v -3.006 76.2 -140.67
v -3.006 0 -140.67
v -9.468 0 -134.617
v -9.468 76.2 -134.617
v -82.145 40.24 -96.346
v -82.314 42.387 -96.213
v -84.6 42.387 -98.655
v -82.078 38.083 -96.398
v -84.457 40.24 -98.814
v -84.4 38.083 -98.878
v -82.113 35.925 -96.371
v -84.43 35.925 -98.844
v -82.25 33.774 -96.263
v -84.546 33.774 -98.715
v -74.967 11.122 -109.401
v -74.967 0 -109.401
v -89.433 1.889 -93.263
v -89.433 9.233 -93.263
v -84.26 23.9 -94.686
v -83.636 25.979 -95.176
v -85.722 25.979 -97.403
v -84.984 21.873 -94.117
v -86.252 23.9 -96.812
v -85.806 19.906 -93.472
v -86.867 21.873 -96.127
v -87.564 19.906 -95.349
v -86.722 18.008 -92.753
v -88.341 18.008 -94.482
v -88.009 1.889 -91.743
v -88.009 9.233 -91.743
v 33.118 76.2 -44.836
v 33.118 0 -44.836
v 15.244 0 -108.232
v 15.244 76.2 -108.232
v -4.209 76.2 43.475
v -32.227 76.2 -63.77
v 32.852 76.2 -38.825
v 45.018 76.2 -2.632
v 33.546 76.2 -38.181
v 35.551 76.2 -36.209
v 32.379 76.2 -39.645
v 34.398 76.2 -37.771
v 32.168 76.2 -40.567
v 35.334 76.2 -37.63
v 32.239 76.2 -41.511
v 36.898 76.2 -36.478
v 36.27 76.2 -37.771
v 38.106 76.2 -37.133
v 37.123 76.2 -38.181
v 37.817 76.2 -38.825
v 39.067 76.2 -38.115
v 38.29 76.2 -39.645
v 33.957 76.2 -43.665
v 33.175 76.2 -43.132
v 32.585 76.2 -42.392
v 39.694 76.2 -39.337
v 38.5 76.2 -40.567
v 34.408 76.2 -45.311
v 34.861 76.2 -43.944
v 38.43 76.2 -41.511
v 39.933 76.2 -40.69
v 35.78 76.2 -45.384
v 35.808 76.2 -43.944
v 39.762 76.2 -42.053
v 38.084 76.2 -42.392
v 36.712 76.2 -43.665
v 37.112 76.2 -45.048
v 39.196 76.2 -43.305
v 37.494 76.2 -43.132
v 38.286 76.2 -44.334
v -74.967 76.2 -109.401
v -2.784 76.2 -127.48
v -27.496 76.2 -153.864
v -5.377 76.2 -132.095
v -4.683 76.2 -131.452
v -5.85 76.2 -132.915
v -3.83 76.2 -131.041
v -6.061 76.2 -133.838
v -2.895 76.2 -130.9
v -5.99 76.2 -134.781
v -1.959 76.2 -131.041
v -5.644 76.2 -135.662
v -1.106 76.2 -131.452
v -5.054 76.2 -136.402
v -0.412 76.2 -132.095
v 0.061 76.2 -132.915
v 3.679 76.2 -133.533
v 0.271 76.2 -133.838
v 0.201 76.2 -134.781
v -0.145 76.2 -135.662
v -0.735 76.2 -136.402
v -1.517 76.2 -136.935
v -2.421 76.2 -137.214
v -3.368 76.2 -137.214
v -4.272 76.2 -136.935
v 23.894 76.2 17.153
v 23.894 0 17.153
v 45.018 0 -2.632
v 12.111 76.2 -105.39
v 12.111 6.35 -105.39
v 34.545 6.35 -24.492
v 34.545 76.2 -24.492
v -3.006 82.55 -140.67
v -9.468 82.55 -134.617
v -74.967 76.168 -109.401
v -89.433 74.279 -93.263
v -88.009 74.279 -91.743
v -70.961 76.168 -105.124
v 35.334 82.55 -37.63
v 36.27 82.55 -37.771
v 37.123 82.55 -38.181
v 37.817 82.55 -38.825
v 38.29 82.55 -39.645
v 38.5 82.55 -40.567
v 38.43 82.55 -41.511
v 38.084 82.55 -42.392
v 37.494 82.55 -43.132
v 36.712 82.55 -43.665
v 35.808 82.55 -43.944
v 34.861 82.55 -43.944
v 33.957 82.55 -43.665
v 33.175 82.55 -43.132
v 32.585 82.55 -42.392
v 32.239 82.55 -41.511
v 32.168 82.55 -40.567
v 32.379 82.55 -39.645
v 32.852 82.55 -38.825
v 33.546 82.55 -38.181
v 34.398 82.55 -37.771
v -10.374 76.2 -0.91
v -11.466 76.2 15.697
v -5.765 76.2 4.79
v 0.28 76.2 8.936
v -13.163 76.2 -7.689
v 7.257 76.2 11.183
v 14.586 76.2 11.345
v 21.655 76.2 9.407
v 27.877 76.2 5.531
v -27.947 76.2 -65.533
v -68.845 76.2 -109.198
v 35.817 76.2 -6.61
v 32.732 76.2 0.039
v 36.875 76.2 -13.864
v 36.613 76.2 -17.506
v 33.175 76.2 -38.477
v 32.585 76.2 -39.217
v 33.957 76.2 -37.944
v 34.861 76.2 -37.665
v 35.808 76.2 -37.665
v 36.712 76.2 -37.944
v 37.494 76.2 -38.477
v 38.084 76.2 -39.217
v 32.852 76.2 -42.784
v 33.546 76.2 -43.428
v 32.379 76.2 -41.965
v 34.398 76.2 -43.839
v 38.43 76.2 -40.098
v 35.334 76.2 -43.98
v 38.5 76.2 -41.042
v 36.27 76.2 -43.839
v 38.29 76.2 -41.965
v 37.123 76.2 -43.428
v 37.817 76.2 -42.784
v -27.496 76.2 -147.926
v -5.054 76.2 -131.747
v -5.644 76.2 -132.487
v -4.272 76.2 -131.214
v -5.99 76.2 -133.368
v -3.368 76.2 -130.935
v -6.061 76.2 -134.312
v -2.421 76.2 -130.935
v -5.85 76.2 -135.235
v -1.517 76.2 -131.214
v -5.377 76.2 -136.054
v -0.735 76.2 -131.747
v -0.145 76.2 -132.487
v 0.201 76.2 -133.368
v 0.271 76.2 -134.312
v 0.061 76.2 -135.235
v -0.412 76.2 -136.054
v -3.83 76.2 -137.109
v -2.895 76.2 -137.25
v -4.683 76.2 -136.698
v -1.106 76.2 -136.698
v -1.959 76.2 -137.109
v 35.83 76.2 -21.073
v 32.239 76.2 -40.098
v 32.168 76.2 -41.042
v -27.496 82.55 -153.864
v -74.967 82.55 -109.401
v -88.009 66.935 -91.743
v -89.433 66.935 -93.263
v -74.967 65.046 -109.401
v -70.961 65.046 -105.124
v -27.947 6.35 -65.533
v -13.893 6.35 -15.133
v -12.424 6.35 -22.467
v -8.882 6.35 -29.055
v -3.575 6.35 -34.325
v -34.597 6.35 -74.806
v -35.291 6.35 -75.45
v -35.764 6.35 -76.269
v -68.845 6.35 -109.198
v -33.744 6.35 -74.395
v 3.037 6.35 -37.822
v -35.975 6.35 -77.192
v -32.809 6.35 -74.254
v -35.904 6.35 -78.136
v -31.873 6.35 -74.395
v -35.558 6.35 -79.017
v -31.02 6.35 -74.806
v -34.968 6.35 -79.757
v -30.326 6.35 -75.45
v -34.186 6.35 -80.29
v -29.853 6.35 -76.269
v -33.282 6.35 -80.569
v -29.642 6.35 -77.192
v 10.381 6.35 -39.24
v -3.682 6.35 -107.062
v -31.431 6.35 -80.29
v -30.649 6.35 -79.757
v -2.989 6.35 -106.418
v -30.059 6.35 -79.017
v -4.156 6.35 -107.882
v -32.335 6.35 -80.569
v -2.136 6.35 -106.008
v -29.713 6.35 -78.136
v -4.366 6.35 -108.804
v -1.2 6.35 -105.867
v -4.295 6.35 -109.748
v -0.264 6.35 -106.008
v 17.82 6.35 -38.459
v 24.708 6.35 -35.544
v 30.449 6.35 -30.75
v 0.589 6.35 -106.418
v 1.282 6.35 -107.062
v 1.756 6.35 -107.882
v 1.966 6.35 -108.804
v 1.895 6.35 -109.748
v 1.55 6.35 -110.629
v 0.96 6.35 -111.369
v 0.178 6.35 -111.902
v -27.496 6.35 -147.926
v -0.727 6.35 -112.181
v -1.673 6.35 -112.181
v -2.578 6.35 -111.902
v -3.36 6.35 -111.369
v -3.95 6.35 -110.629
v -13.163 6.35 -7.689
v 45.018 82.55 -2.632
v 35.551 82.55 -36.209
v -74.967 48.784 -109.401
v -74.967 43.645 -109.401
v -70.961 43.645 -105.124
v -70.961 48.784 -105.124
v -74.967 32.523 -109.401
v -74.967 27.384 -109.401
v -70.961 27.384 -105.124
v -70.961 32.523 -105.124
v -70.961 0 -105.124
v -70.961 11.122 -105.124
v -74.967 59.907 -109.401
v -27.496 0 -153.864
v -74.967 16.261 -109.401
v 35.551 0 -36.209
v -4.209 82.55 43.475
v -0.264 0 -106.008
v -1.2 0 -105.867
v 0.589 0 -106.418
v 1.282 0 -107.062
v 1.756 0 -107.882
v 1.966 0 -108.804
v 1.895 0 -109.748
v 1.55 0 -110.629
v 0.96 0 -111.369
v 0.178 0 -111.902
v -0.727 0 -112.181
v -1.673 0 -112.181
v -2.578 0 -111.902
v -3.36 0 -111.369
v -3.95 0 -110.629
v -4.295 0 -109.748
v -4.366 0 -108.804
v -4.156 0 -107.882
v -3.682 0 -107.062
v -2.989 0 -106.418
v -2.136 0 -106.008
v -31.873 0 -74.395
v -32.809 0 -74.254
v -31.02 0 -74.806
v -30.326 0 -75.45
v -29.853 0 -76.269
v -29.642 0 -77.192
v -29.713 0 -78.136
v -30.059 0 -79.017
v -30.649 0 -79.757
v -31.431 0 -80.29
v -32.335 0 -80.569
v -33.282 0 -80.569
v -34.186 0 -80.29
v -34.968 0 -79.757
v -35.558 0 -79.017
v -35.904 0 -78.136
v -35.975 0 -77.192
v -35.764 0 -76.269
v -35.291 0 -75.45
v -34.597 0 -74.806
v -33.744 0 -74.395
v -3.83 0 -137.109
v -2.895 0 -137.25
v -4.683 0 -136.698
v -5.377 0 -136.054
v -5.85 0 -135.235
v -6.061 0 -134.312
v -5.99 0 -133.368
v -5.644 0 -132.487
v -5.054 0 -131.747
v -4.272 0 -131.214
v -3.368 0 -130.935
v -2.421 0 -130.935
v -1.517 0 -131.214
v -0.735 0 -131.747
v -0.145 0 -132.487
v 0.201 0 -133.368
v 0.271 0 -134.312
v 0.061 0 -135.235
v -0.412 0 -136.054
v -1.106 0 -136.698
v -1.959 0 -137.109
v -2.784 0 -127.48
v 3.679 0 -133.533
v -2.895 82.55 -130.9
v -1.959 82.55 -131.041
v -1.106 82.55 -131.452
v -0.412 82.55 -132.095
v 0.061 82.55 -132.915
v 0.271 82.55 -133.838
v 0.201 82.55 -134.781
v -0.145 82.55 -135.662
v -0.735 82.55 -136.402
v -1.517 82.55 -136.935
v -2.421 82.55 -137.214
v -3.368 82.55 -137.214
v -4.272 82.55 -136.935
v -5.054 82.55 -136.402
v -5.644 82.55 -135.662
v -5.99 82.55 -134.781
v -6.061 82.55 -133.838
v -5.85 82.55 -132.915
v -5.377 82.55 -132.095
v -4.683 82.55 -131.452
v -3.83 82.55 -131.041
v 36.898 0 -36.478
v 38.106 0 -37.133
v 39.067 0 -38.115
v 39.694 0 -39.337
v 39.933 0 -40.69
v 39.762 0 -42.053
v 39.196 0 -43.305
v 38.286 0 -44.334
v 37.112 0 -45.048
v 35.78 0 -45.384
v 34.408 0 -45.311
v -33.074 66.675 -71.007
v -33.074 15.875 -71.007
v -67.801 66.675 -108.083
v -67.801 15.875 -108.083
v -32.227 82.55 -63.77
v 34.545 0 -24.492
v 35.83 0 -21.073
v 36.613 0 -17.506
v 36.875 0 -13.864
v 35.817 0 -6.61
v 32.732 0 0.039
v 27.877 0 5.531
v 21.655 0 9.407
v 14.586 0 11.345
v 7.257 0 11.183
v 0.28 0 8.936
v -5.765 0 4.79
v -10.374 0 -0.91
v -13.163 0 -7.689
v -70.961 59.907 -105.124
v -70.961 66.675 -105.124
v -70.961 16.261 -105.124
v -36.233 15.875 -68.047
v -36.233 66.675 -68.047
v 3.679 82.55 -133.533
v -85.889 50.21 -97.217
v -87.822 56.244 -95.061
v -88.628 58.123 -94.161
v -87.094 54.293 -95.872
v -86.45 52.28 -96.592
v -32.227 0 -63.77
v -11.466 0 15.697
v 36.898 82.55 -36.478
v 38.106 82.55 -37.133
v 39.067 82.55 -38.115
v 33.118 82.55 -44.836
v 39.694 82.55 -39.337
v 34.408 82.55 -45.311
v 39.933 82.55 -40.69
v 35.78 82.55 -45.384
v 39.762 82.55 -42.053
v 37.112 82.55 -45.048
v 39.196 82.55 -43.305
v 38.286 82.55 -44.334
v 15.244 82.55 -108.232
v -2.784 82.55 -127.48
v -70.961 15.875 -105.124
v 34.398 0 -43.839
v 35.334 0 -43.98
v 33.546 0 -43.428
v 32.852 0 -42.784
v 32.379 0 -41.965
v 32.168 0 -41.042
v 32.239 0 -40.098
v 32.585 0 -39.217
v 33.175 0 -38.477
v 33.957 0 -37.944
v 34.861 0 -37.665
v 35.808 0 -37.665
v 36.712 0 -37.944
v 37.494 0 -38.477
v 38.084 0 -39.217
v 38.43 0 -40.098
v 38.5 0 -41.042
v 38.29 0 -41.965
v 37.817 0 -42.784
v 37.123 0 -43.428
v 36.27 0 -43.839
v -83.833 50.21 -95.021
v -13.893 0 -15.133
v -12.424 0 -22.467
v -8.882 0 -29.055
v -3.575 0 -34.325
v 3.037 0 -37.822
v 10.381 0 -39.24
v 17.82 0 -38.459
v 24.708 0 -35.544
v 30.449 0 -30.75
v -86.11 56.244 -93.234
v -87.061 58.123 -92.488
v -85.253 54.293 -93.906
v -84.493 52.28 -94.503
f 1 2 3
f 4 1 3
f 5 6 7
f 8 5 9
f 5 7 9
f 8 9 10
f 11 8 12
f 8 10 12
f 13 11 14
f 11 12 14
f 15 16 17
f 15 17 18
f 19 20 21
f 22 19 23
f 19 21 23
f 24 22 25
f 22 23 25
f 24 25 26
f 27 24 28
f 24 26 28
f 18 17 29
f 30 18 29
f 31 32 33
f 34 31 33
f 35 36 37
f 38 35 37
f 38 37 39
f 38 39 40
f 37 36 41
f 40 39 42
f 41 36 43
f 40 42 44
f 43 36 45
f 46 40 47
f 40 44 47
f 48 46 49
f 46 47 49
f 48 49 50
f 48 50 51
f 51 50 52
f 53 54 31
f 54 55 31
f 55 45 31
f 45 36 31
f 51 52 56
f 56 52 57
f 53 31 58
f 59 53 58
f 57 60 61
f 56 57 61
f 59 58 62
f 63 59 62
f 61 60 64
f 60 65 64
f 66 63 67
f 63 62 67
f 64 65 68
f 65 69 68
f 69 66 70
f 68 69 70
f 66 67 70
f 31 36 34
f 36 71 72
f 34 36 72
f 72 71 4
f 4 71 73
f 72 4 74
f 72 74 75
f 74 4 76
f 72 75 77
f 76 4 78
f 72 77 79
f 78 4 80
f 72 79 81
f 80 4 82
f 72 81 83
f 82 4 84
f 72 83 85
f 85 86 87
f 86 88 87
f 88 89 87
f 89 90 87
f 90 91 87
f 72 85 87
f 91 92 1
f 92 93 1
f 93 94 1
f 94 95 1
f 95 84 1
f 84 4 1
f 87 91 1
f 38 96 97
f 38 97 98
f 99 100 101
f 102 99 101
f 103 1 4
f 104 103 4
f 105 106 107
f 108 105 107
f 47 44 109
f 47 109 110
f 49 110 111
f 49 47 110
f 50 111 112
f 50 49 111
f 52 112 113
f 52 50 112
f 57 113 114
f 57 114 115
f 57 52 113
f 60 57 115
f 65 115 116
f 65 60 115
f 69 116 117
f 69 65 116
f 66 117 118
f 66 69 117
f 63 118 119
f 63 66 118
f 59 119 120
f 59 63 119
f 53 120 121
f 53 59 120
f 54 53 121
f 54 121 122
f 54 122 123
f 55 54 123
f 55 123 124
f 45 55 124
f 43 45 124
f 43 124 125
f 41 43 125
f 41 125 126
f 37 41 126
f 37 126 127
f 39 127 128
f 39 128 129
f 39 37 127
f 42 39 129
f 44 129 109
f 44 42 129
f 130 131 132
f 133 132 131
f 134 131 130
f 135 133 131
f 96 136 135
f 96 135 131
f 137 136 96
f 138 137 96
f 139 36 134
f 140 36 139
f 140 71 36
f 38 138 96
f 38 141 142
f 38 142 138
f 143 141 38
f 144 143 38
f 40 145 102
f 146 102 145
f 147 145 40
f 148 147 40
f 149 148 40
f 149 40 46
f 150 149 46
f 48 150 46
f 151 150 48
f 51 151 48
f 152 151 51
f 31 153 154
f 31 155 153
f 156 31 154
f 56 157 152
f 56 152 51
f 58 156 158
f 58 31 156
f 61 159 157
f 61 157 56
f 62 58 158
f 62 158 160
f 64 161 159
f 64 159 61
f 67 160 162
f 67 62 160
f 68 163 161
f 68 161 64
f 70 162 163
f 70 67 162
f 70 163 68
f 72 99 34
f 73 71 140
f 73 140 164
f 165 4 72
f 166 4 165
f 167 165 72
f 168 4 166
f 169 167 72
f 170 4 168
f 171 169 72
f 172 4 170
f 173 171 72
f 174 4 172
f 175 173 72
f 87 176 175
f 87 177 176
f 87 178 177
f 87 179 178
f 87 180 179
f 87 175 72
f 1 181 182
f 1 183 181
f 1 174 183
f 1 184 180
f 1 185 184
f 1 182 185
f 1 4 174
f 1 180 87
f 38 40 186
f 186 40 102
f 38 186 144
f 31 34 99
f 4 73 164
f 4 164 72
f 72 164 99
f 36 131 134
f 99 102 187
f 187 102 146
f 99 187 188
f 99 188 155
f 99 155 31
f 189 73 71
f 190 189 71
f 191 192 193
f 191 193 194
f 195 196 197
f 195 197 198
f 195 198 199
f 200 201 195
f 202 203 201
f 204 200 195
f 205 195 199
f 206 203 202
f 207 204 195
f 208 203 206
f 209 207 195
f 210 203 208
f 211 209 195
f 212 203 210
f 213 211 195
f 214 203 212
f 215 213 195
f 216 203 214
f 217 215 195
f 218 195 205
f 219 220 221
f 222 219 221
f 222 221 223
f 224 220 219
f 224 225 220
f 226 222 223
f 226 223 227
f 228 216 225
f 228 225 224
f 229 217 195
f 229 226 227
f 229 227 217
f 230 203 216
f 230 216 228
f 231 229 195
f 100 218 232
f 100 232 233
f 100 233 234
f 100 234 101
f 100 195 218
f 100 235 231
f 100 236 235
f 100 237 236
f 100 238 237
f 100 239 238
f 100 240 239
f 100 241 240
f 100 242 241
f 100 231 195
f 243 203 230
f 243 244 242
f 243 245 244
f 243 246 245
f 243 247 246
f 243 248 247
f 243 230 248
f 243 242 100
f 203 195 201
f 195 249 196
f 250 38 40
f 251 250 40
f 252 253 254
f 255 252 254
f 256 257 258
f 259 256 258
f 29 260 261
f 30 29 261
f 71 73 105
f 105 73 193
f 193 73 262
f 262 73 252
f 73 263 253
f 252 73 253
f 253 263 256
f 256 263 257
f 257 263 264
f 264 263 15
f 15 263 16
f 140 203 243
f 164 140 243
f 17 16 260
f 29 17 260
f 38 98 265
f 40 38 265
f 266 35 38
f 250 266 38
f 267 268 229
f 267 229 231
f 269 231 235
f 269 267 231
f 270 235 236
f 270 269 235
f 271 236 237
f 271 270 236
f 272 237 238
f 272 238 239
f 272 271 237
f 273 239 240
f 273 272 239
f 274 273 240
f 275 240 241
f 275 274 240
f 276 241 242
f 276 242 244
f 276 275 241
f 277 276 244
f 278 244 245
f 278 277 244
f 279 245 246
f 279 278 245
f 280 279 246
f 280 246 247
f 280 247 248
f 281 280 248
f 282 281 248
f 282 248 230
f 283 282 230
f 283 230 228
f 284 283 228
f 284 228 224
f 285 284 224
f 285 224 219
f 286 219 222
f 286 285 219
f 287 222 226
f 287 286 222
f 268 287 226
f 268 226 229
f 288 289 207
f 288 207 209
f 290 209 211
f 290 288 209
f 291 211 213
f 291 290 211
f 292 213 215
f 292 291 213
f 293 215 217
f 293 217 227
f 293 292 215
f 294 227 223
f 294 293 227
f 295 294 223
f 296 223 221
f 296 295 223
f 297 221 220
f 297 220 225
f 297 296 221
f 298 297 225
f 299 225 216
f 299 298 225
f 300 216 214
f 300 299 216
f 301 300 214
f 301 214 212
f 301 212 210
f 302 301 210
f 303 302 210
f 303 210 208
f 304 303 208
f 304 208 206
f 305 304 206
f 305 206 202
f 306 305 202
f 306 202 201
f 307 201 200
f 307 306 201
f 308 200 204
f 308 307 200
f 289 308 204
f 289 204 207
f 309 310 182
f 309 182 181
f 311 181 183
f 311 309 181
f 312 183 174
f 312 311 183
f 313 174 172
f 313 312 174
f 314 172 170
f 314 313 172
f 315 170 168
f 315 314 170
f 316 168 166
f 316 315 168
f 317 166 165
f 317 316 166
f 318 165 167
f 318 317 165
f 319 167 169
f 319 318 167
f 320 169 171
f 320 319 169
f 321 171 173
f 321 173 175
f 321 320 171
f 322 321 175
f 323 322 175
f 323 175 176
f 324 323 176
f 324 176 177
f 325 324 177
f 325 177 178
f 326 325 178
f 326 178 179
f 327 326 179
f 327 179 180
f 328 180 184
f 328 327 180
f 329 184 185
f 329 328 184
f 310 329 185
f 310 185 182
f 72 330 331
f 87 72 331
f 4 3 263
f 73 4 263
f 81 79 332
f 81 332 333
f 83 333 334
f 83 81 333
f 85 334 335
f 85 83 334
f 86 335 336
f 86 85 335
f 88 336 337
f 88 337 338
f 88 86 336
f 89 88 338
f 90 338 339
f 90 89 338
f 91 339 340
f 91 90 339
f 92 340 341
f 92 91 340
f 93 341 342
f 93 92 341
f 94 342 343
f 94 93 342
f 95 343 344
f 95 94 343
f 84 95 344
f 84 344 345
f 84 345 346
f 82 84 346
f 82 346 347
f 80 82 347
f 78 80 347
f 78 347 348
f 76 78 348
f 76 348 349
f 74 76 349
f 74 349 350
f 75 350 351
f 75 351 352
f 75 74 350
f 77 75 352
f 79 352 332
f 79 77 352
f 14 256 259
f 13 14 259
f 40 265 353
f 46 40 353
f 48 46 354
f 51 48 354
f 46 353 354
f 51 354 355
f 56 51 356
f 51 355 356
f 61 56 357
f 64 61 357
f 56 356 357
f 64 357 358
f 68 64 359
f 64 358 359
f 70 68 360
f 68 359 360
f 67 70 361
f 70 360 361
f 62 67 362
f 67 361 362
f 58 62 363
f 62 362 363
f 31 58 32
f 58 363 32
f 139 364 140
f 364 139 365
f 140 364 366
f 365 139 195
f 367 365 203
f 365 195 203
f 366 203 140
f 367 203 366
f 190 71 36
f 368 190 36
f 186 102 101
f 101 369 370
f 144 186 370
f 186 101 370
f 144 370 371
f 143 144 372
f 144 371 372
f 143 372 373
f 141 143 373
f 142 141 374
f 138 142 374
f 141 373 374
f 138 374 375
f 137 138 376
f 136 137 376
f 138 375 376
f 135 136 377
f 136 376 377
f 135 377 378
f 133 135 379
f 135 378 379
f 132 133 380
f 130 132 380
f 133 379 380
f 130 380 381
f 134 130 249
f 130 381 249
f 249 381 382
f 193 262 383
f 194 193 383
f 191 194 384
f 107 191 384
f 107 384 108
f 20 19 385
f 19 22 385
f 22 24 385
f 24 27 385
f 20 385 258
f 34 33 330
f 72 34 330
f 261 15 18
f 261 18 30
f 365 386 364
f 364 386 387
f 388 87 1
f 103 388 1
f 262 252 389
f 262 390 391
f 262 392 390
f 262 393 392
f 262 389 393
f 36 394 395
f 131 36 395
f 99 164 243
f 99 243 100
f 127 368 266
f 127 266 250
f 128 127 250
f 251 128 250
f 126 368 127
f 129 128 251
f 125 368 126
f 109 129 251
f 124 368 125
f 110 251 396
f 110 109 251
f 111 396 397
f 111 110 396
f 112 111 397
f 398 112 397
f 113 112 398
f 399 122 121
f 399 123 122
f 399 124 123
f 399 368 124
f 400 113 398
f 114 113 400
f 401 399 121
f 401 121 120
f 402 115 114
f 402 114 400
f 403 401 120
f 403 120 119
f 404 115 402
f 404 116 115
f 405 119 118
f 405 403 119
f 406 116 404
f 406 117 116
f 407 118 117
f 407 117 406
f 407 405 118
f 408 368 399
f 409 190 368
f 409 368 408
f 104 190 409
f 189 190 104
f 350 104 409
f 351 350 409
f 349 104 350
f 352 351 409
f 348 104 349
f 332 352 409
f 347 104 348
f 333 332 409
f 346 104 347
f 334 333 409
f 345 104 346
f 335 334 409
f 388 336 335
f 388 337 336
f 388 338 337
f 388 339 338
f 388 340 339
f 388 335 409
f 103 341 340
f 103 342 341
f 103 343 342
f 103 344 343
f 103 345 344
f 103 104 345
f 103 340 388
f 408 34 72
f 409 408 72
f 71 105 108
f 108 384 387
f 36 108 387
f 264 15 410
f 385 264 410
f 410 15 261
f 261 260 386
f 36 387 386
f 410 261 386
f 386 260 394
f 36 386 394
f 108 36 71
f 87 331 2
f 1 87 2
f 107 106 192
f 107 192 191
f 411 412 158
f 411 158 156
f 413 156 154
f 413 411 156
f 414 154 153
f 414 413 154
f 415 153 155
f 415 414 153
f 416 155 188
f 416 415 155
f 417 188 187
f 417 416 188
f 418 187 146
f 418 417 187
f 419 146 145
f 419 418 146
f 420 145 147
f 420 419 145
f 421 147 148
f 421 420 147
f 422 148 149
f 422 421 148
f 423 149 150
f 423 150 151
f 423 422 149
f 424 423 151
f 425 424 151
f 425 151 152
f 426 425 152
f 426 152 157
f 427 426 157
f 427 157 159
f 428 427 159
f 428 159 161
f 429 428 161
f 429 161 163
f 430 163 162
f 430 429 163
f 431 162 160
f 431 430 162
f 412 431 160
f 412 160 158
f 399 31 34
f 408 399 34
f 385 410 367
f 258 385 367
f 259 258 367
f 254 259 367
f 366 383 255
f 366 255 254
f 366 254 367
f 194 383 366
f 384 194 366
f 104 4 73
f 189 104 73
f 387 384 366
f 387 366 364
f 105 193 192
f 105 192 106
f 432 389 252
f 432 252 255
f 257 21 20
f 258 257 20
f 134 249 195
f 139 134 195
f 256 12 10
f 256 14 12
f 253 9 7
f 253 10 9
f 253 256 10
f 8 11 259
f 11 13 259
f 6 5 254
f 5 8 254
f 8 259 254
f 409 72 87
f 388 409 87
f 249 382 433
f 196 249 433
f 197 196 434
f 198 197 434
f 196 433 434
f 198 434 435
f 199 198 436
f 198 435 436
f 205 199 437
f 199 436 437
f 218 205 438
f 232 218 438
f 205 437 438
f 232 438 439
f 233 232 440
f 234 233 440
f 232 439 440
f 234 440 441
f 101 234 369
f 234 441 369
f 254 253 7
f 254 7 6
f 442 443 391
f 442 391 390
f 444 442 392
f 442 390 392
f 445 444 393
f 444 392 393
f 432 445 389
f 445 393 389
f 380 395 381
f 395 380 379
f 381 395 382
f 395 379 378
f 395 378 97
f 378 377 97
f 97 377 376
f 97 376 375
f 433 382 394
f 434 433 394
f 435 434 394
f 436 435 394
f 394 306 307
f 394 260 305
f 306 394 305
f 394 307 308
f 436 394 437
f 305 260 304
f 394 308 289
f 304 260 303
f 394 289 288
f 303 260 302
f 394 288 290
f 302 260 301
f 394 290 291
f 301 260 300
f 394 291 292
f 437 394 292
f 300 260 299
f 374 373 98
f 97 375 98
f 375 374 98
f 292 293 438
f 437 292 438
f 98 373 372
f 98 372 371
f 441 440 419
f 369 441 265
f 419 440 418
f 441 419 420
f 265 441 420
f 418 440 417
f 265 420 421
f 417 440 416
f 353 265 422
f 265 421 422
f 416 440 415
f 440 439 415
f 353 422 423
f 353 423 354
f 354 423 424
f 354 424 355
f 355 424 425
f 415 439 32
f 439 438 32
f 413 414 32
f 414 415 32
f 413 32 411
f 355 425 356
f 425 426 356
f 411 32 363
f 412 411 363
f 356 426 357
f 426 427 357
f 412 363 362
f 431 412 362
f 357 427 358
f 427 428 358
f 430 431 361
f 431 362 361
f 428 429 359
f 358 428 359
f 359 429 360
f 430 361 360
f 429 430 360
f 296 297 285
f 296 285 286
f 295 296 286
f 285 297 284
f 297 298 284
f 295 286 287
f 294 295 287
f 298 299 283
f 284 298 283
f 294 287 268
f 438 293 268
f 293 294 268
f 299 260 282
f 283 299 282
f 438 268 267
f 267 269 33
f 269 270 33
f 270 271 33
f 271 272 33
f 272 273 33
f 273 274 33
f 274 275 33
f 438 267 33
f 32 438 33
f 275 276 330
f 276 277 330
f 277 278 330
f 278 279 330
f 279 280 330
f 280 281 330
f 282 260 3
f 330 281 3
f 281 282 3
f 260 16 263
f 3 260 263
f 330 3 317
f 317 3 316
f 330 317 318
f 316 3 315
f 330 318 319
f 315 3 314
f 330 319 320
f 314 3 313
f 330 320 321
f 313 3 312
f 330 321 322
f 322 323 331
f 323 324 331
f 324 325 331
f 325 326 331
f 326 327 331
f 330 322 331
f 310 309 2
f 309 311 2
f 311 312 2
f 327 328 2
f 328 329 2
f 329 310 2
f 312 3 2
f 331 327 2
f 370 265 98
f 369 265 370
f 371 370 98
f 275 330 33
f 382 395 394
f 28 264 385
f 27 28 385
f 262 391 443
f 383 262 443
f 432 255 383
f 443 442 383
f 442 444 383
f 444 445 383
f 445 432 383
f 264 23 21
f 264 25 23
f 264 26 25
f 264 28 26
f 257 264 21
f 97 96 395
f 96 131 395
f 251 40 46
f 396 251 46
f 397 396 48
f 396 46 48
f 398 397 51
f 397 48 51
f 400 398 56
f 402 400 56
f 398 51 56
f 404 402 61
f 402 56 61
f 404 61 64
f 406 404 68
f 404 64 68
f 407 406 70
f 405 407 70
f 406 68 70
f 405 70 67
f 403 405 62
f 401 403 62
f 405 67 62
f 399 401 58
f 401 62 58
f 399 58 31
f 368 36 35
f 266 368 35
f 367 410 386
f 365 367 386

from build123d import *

# Parameters (mm, degrees)
SKETCH1_R                     = 3.175
BOSS_EXTRUDE2_DEPTH           = 76.2
SKETCH1_5_R                   = 3.175
BOSS_EXTRUDE3_DEPTH           = 6.35
SKETCH5_R                     = 3.175
BOSS_EXTRUDE4_DEPTH           = 6.35
SKETCH6_W                     = 50.8
SKETCH6_H                     = 50.8
CUT_EXTRUDE1_DEPTH            = 21.59
SKETCH7_W                     = 5.86068256
SKETCH7_H                     = 11.122345704
BOSS_EXTRUDE5_DEPTH           = 21.59
BOSS_EXTRUDE5_DRAFT           = 5
BOSS_EXTRUDE5_PROFILE_2_DEPTH = 21.59
BOSS_EXTRUDE5_PROFILE_2_DRAFT = 5
BOSS_EXTRUDE5_PROFILE_3_DEPTH = 21.59
BOSS_EXTRUDE5_PROFILE_3_DRAFT = 5
SKETCH7_H_2                   = 11.122345705
BOSS_EXTRUDE5_PROFILE_4_DEPTH = 21.59
BOSS_EXTRUDE5_PROFILE_4_DRAFT = 5
BOSS_EXTRUDE5_PROFILE_5_DEPTH = 21.59
BOSS_EXTRUDE5_PROFILE_5_DRAFT = 5
SKETCH10_R                    = 36.051864109
CUT_EXTRUDE2_DEPTH            = 21.59
CUT_EXTRUDE3_START            = -5.08
SKETCH11_W                    = 102.376221927
SKETCH11_H                    = 148.639543751
CUT_EXTRUDE3_DEPTH            = 33.02


with BuildPart() as part:
    # Sketch1 → Boss-Extrude2 (new body)
    with BuildSketch(Plane(origin=(0, 0, 0), x_dir=(1, 0, 0), z_dir=(0, 1, 0))):
        with BuildLine():
            Line((-4.208751998, -43.475305064), (45.017746951, 2.631829887))
            Line((45.017746951, 2.631829887), (35.550660053, 36.209226482))
            ThreePointArc((35.550660053, 36.209226482), (39.762177432, 42.05307025), (33.11828595, 44.83625091))
            Line((33.11828595, 44.83625091), (15.243844224, 108.232438689))
            Line((15.243844224, 108.232438689), (-2.783728935, 127.479661752))
            Line((-2.783728935, 127.479661752), (3.678966496, 133.532831827))
            Line((3.678966496, 133.532831827), (-3.005742225, 140.669792455))
            Line((-3.005742225, 140.669792455), (-9.468437655, 134.61662238))
            Line((-9.468437655, 134.61662238), (-27.496010814, 153.863845442))
            Line((-27.496010814, 153.863845442), (-74.966911398, 109.401060841))
            Line((-74.966911398, 109.401060841), (-32.227053049, 63.769650553))
            Line((-32.227053049, 63.769650553), (-4.208751998, -43.475305064))
        make_face()
        with Locations((35.334305242, 40.804639607)):
            Circle(SKETCH1_R, mode=Mode.SUBTRACT)
        with BuildLine():
            Line((-27.946524097, 65.532765046), (-68.844709626, 109.197904706))
            Line((-68.844709626, 109.197904706), (-27.496010814, 147.926436632))
            Line((-27.496010814, 147.926436632), (12.111157264, 105.390011693))
            Line((12.111157264, 105.390011693), (34.544848217, 24.491577435))
            ThreePointArc((34.544848217, 24.491577435), (36.285698832, 19.303992732), (36.875100326, 13.863937421))
            ThreePointArc((36.875100326, 13.863937421), (14.585843996, -11.34485616), (-13.162952731, 7.689284266))
            Line((-13.162952731, 7.689284266), (-27.946524097, 65.532765046))
        make_face(mode=Mode.SUBTRACT)
        with Locations((-2.894634056, 134.074815557)):
            Circle(SKETCH1_R, mode=Mode.SUBTRACT)
    extrude(amount=BOSS_EXTRUDE2_DEPTH)

    # Sketch1<5> → Boss-Extrude3 (add)
    with BuildSketch(Plane(origin=(0, 0, 0), x_dir=(1, 0, 0), z_dir=(0, 1, 0))):
        with BuildLine():
            Line((-27.496010814, 147.926436632), (-68.844709626, 109.197904706))
            Line((-68.844709626, 109.197904706), (-27.946524097, 65.532765046))
            Line((-27.946524097, 65.532765046), (-13.162952731, 7.689284266))
            ThreePointArc((-13.162952731, 7.689284266), (3.03743719, 37.821521623), (34.544848217, 24.491577435))
            Line((34.544848217, 24.491577435), (12.111157264, 105.390011693))
            Line((12.111157264, 105.390011693), (-27.496010814, 147.926436632))
        make_face()
        with Locations((-32.808552916, 77.429328599)):
            Circle(SKETCH1_5_R, mode=Mode.SUBTRACT)
        with Locations((-1.199981142, 109.041759799)):
            Circle(SKETCH1_5_R, mode=Mode.SUBTRACT)
    extrude(amount=BOSS_EXTRUDE3_DEPTH)

    # Sketch6 → Cut-Extrude1 (cut)
    with BuildSketch(Plane(origin=(14.64974053, 0, -13.721421958), x_dir=(0.683604049055853, 0, 0.729853070223345), z_dir=(-0.729853070223345, 0, 0.683604049055853))):
        with Locations((-99.833701757, 41.275)):
            Rectangle(SKETCH6_W, SKETCH6_H)
    extrude(amount=-CUT_EXTRUDE1_DEPTH, mode=Mode.SUBTRACT)


with BuildPart() as body_2:
    # Sketch5 → Boss-Extrude4 (new body)
    with BuildSketch(Plane(origin=(0, 76.2, 0), x_dir=(1, 0, 0), z_dir=(0, 1, 0))):
        with BuildLine():
            Line((45.017746951, 2.631829887), (35.550660053, 36.209226482))
            ThreePointArc((35.550660053, 36.209226482), (39.762177432, 42.05307025), (33.11828595, 44.83625091))
            Line((33.11828595, 44.83625091), (15.243844224, 108.232438689))
            Line((15.243844224, 108.232438689), (-2.783728935, 127.479661752))
            Line((-2.783728935, 127.479661752), (3.678966496, 133.532831827))
            Line((3.678966496, 133.532831827), (-3.005742225, 140.669792455))
            Line((-3.005742225, 140.669792455), (-9.468437655, 134.61662238))
            Line((-9.468437655, 134.61662238), (-27.496010814, 153.863845442))
            Line((-27.496010814, 153.863845442), (-74.966911398, 109.401060841))
            Line((-74.966911398, 109.401060841), (-32.227053049, 63.769650553))
            Line((-32.227053049, 63.769650553), (-4.208751998, -43.475305064))
            Line((-4.208751998, -43.475305064), (45.017746951, 2.631829887))
        make_face()
        with Locations((-2.894634056, 134.074815557)):
            Circle(SKETCH5_R, mode=Mode.SUBTRACT)
        with Locations((35.334305242, 40.804639607)):
            Circle(SKETCH5_R, mode=Mode.SUBTRACT)
    extrude(amount=BOSS_EXTRUDE4_DEPTH)


with BuildPart() as boss_extrude5_tool:
    # Sketch7 → Boss-Extrude5 (with draft: the straight prism first)
    with BuildSketch(Plane(origin=(14.64974053, 0, -13.721421958), x_dir=(0.683604049055853, 0, 0.729853070223345), z_dir=(-0.729853070223345, 0, 0.683604049055853))):
        with Locations((-128.164043037, 70.606947953)):
            Rectangle(SKETCH7_W, SKETCH7_H)
    extrude(amount=BOSS_EXTRUDE5_DEPTH)
    # Boss-Extrude5: the draft: its side faces are tilted about the plane it starts from
    boss_extrude5_sides = [boss_extrude5_tool.faces().sort_by_distance(p)[0] for p in [
        (-82.845675291, 70.606947953, -102.021555132),
        (-80.842482126, 65.045775101, -99.882836552),
        (-78.839288962, 70.606947953, -97.744117972),
        (-80.842482126, 76.168120805, -99.882836552),
    ]]
    draft(boss_extrude5_sides, Plane(origin=(14.64974053, 0, -13.721421958), x_dir=(0.683604049055853, 0, 0.729853070223345), z_dir=(-0.729853070223345, 0, 0.683604049055853)), BOSS_EXTRUDE5_DRAFT)


with BuildPart() as part_1:
    add(part.part)

    # Boss-Extrude5: add boss_extrude5_tool
    add(boss_extrude5_tool.part)


with BuildPart() as boss_extrude5_profile_2_tool:
    # Sketch7 → Boss-Extrude5 profile 2 (with draft: the straight prism first)
    with BuildSketch(Plane(origin=(14.64974053, 0, -13.721421958), x_dir=(0.683604049055853, 0, 0.729853070223345), z_dir=(-0.729853070223345, 0, 0.683604049055853))):
        with Locations((-128.164043037, 54.345504178)):
            Rectangle(SKETCH7_W, SKETCH7_H)
    extrude(amount=BOSS_EXTRUDE5_PROFILE_2_DEPTH)
    # Boss-Extrude5 profile 2: the draft: its side faces are tilted about the plane it starts from
    boss_extrude5_profile_2_sides = [boss_extrude5_profile_2_tool.faces().sort_by_distance(p)[0] for p in [
        (-80.842482126, 48.784331326, -99.882836552),
        (-78.839288962, 54.345504178, -97.744117972),
        (-80.842482126, 59.90667703, -99.882836552),
        (-82.845675291, 54.345504178, -102.021555132),
    ]]
    draft(boss_extrude5_profile_2_sides, Plane(origin=(14.64974053, 0, -13.721421958), x_dir=(0.683604049055853, 0, 0.729853070223345), z_dir=(-0.729853070223345, 0, 0.683604049055853)), BOSS_EXTRUDE5_PROFILE_2_DRAFT)


with BuildPart() as part_2:
    add(part_1.part)

    # Boss-Extrude5 profile 2: add boss_extrude5_profile_2_tool
    add(boss_extrude5_profile_2_tool.part)


with BuildPart() as boss_extrude5_profile_3_tool:
    # Sketch7 → Boss-Extrude5 profile 3 (with draft: the straight prism first)
    with BuildSketch(Plane(origin=(14.64974053, 0, -13.721421958), x_dir=(0.683604049055853, 0, 0.729853070223345), z_dir=(-0.729853070223345, 0, 0.683604049055853))):
        with Locations((-128.164043037, 38.084060403)):
            Rectangle(SKETCH7_W, SKETCH7_H)
    extrude(amount=BOSS_EXTRUDE5_PROFILE_3_DEPTH)
    # Boss-Extrude5 profile 3: the draft: its side faces are tilted about the plane it starts from
    boss_extrude5_profile_3_sides = [boss_extrude5_profile_3_tool.faces().sort_by_distance(p)[0] for p in [
        (-80.842482126, 32.522887551, -99.882836552),
        (-78.839288962, 38.084060403, -97.744117972),
        (-80.842482126, 43.645233255, -99.882836552),
        (-82.845675291, 38.084060403, -102.021555132),
    ]]
    draft(boss_extrude5_profile_3_sides, Plane(origin=(14.64974053, 0, -13.721421958), x_dir=(0.683604049055853, 0, 0.729853070223345), z_dir=(-0.729853070223345, 0, 0.683604049055853)), BOSS_EXTRUDE5_PROFILE_3_DRAFT)


with BuildPart() as part_3:
    add(part_2.part)

    # Boss-Extrude5 profile 3: add boss_extrude5_profile_3_tool
    add(boss_extrude5_profile_3_tool.part)


with BuildPart() as boss_extrude5_profile_4_tool:
    # Sketch7 → Boss-Extrude5 profile 4 (with draft: the straight prism first)
    with BuildSketch(Plane(origin=(14.64974053, 0, -13.721421958), x_dir=(0.683604049055853, 0, 0.729853070223345), z_dir=(-0.729853070223345, 0, 0.683604049055853))):
        with Locations((-128.164043037, 21.822616628)):
            Rectangle(SKETCH7_W, SKETCH7_H_2)
    extrude(amount=BOSS_EXTRUDE5_PROFILE_4_DEPTH)
    # Boss-Extrude5 profile 4: the draft: its side faces are tilted about the plane it starts from
    boss_extrude5_profile_4_sides = [boss_extrude5_profile_4_tool.faces().sort_by_distance(p)[0] for p in [
        (-80.842482126, 16.261443775, -99.882836552),
        (-78.839288962, 21.822616627, -97.744117972),
        (-80.842482126, 27.38378948, -99.882836552),
        (-82.845675291, 21.822616627, -102.021555132),
    ]]
    draft(boss_extrude5_profile_4_sides, Plane(origin=(14.64974053, 0, -13.721421958), x_dir=(0.683604049055853, 0, 0.729853070223345), z_dir=(-0.729853070223345, 0, 0.683604049055853)), BOSS_EXTRUDE5_PROFILE_4_DRAFT)


with BuildPart() as part_4:
    add(part_3.part)

    # Boss-Extrude5 profile 4: add boss_extrude5_profile_4_tool
    add(boss_extrude5_profile_4_tool.part)


with BuildPart() as boss_extrude5_profile_5_tool:
    # Sketch7 → Boss-Extrude5 profile 5 (with draft: the straight prism first)
    with BuildSketch(Plane(origin=(14.64974053, 0, -13.721421958), x_dir=(0.683604049055853, 0, 0.729853070223345), z_dir=(-0.729853070223345, 0, 0.683604049055853))):
        with Locations((-128.164043037, 5.561172852)):
            Rectangle(SKETCH7_W, SKETCH7_H)
    extrude(amount=BOSS_EXTRUDE5_PROFILE_5_DEPTH)
    # Boss-Extrude5 profile 5: the draft: its side faces are tilted about the plane it starts from
    boss_extrude5_profile_5_sides = [boss_extrude5_profile_5_tool.faces().sort_by_distance(p)[0] for p in [
        (-80.842482126, 0, -99.882836552),
        (-78.839288962, 5.561172852, -97.744117972),
        (-80.842482126, 11.122345704, -99.882836552),
        (-82.845675291, 5.561172852, -102.021555132),
    ]]
    draft(boss_extrude5_profile_5_sides, Plane(origin=(14.64974053, 0, -13.721421958), x_dir=(0.683604049055853, 0, 0.729853070223345), z_dir=(-0.729853070223345, 0, 0.683604049055853)), BOSS_EXTRUDE5_PROFILE_5_DRAFT)


with BuildPart() as part_5:
    add(part_4.part)

    # Boss-Extrude5 profile 5: add boss_extrude5_profile_5_tool
    add(boss_extrude5_profile_5_tool.part)

    # Sketch10 → Cut-Extrude2 (cut)
    with BuildSketch(Plane(origin=(-89.616651928, 0, -95.679638883), x_dir=(-0.7298530702233451, 0, 0.683604049055853), z_dir=(-0.683604049055853, 0, -0.7298530702233451))):
        with Locations((30.057024975, 37.74518963)):
            Circle(SKETCH10_R)
    extrude(amount=-CUT_EXTRUDE2_DEPTH, mode=Mode.SUBTRACT)

    # Sketch11 → Cut-Extrude3 (cut)
    with BuildSketch(Plane(origin=(-0.455771155, 0, 11.066213292), x_dir=(0, -1, 0), z_dir=(0.04115094100910027, 0, -0.9991529412727892)).offset(CUT_EXTRUDE3_START)):
        with Locations((-28.770085538, 5.325235466)):
            Rectangle(SKETCH11_W, SKETCH11_H)
    extrude(amount=-CUT_EXTRUDE3_DEPTH, mode=Mode.SUBTRACT)


solid = Compound([body_2.part, part_5.part])
